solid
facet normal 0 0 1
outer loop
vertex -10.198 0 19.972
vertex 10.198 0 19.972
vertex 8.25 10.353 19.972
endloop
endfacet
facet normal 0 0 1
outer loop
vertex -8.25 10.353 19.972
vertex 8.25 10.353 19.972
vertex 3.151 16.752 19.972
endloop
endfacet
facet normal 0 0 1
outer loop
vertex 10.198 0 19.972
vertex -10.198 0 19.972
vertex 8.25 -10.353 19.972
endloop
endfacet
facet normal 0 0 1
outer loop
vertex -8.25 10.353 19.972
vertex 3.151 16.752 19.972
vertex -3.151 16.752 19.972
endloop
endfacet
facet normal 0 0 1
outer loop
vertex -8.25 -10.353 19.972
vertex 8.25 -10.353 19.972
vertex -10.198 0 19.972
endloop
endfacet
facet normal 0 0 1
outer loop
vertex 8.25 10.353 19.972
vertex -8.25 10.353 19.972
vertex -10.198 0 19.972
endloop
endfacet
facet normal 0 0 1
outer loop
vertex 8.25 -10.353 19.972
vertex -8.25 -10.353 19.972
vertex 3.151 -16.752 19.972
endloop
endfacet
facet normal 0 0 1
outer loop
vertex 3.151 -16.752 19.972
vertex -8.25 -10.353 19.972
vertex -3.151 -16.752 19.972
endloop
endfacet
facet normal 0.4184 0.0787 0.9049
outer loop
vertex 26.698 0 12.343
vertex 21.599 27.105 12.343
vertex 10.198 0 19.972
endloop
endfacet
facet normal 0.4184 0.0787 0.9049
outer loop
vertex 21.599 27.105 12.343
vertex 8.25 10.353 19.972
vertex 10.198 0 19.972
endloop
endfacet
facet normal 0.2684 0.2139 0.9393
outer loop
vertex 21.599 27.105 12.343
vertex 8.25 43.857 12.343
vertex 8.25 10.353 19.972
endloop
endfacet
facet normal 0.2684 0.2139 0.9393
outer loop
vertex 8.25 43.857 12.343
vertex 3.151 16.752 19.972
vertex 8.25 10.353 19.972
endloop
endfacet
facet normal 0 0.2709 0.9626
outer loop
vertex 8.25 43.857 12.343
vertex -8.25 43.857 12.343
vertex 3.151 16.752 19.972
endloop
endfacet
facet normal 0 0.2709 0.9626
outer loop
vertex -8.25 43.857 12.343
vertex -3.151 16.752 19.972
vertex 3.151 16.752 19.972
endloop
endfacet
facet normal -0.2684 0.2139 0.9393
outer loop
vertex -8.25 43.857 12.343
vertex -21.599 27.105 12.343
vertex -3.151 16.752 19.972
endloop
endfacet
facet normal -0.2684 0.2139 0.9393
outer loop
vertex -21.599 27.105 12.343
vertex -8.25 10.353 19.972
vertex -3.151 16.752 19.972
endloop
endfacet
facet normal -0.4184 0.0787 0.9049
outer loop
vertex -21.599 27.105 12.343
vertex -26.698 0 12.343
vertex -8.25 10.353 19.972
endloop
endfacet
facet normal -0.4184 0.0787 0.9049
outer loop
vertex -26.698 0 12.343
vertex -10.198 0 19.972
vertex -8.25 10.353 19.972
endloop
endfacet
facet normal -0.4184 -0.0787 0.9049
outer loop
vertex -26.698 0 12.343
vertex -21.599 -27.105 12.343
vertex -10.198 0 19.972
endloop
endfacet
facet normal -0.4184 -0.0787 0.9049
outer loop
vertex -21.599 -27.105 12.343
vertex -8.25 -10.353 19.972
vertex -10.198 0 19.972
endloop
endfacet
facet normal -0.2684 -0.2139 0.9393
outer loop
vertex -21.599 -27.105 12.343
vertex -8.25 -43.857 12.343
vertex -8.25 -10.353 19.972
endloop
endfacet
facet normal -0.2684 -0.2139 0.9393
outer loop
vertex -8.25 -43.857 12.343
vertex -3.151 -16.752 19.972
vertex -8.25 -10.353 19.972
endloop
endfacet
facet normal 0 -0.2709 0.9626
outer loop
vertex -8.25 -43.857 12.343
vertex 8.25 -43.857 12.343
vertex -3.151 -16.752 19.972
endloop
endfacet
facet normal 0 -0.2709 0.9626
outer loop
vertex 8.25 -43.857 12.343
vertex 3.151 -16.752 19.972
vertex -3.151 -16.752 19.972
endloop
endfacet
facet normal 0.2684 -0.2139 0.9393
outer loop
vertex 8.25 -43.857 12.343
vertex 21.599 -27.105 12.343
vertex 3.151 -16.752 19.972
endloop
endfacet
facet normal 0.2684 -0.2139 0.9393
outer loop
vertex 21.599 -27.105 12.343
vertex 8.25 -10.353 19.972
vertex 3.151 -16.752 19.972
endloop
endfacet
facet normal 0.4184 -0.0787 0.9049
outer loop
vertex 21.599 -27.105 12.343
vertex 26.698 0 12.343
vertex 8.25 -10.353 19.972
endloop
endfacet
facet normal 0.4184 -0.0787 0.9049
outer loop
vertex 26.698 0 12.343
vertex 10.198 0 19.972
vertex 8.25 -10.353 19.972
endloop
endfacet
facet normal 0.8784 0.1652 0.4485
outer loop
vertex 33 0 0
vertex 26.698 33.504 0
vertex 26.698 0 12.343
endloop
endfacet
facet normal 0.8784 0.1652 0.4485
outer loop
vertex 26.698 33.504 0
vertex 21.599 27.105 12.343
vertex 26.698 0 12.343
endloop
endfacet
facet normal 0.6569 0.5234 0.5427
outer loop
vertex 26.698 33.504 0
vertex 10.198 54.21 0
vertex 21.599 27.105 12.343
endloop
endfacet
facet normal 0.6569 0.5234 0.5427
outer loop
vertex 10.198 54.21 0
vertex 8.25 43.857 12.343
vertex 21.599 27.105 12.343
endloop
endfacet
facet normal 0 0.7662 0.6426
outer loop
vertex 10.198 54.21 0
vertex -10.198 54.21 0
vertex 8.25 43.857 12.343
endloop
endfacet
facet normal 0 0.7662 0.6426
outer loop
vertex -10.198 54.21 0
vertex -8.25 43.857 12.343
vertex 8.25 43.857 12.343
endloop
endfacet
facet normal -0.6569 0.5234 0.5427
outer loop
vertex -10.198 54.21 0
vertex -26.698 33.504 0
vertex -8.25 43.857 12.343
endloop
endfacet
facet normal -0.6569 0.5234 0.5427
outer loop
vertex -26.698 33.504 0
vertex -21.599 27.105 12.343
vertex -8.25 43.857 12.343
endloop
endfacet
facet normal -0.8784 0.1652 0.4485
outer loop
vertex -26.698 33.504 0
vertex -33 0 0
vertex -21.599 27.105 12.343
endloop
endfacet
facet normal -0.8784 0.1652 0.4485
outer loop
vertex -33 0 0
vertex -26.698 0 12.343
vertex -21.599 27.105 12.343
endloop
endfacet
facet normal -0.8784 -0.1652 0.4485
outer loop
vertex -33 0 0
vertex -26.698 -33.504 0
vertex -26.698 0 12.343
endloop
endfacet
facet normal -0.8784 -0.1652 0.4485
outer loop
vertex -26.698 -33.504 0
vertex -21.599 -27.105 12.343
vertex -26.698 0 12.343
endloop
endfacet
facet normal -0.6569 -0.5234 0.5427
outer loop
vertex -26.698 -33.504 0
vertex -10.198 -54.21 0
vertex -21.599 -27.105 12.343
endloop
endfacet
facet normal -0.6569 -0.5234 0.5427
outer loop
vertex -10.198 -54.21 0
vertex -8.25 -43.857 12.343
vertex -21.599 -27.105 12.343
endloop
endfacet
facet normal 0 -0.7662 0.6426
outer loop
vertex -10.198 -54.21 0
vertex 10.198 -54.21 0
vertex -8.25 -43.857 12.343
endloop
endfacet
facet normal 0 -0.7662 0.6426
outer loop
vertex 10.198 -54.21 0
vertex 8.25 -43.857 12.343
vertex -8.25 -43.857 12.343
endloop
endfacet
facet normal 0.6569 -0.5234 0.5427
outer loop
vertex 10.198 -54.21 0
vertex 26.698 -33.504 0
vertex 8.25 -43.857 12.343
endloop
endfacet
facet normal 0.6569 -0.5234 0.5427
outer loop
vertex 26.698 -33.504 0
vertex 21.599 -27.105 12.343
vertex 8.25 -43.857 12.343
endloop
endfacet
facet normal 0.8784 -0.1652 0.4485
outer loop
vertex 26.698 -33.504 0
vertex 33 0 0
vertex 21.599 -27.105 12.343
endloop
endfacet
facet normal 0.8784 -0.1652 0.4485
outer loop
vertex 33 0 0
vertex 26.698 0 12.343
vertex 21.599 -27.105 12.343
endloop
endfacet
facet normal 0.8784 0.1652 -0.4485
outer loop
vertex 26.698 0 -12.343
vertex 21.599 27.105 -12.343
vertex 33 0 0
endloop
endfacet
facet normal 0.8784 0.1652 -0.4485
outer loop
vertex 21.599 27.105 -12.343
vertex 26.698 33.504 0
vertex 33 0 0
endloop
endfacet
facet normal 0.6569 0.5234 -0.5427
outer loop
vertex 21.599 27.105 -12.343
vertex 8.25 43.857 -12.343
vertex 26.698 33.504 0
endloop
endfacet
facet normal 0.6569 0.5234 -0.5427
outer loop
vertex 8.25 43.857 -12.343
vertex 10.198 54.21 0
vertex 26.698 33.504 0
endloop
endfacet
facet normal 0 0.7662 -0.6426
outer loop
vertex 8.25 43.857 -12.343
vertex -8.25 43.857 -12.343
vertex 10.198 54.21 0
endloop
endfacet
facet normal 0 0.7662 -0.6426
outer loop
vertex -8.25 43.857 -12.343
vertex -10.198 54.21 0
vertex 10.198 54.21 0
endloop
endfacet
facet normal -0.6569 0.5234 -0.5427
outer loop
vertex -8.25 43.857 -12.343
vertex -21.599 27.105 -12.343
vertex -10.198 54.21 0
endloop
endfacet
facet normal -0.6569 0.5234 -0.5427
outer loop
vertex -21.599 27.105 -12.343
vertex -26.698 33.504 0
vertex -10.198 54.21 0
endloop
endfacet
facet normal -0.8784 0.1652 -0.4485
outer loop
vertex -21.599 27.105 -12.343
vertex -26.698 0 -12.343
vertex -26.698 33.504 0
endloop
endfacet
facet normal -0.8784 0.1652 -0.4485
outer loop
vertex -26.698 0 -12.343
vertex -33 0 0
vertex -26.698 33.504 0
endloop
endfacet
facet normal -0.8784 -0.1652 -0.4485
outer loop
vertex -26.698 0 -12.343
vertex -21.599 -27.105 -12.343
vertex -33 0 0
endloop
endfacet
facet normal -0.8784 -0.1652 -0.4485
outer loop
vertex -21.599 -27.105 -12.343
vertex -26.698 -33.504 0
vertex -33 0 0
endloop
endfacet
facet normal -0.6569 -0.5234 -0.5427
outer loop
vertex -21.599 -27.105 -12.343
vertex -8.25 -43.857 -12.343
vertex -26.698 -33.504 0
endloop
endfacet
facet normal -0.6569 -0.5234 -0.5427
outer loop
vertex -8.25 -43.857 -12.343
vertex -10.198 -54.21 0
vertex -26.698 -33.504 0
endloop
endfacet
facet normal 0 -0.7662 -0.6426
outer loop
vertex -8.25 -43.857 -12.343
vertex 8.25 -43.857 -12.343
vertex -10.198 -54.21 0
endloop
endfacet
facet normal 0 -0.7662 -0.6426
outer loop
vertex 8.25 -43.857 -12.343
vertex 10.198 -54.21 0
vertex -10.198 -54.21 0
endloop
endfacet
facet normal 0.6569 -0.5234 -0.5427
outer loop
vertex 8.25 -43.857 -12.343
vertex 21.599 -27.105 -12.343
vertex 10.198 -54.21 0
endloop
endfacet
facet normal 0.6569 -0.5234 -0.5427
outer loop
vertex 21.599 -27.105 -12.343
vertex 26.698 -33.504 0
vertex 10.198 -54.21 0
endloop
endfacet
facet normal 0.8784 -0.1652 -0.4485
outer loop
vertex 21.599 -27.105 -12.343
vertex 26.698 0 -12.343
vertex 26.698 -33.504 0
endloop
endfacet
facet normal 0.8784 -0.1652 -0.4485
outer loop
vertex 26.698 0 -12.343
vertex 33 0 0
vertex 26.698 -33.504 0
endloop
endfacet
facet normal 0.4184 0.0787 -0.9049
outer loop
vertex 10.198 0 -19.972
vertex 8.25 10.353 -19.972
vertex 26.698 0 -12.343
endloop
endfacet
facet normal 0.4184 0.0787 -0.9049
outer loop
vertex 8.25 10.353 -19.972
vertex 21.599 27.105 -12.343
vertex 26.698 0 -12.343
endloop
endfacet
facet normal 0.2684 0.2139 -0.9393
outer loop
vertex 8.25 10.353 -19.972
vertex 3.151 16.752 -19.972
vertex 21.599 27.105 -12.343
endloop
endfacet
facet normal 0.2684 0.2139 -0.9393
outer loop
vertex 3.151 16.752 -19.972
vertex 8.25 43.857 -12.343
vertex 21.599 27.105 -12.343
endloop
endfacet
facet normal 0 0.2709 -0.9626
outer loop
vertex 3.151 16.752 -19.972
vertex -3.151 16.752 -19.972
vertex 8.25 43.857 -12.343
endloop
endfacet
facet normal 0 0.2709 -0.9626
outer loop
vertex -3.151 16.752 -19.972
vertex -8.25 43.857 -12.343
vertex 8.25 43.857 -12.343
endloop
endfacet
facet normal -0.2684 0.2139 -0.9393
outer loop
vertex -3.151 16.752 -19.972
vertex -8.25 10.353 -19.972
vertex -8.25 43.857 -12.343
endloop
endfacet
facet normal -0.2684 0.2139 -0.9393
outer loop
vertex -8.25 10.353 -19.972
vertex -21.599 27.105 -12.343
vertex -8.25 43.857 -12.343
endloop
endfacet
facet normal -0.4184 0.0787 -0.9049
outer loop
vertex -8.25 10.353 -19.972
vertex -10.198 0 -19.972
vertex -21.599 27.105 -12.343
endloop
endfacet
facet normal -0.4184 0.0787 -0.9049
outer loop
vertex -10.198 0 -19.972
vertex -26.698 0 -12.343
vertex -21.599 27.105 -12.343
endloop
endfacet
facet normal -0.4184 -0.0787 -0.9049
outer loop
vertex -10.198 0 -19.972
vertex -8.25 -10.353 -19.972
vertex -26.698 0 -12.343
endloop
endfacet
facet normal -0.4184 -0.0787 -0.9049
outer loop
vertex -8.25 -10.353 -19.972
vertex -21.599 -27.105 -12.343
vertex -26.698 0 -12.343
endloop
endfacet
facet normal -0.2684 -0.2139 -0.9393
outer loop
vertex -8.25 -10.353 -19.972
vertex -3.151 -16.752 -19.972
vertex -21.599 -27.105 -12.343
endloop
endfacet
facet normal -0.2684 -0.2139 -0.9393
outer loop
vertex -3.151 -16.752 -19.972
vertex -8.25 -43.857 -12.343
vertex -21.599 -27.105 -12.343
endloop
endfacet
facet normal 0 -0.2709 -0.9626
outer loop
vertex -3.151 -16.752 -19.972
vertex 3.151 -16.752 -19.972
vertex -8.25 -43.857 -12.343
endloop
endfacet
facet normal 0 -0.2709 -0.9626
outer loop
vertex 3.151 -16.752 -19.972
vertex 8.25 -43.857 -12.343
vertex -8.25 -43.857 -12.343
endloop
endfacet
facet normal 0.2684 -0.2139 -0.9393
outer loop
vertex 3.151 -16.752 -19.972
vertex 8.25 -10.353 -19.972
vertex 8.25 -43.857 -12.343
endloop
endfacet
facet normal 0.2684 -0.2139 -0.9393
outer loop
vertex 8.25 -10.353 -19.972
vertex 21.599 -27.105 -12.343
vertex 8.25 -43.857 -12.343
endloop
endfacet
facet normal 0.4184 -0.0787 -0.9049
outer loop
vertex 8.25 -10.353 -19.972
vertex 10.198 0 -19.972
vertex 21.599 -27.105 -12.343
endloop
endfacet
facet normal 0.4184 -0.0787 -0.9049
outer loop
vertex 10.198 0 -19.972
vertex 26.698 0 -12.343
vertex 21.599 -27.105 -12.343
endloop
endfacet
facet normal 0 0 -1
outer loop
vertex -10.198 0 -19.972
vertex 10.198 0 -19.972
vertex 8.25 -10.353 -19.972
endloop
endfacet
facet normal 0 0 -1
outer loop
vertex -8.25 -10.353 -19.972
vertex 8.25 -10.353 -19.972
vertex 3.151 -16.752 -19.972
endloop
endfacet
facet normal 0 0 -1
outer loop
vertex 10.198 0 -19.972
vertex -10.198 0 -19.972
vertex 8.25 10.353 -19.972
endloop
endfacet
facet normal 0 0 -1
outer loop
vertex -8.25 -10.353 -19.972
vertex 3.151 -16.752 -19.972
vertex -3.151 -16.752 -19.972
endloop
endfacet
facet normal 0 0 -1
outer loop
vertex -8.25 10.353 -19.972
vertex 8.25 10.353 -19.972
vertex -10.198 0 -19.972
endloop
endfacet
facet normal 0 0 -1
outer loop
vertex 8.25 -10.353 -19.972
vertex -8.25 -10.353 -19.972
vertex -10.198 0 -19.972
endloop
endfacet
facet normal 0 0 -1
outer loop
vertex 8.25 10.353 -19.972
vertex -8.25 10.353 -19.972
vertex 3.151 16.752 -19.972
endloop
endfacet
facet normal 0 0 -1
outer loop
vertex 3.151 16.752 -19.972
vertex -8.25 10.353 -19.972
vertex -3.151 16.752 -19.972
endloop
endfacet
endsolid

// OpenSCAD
// Generated by SolidPython 1.0.1 on 2020-07-29 00:46:50


scale(v = [11, 19, 7]) {
	sphere(r = 3);
}
/***********************************************
*********      SolidPython code:      **********
************************************************
 
# import packages: SolidPython
from solid import *
from solid.utils import *
from itertools import chain, combinations, permutations


class Resize:

    def __init__(self, scad_file):
        self.scad_file = scad_file
        #self.scad_file = import_scad(scad_file)
        # cone/cylinder param:
        self.r1 = 0
        self.r2 = 0
        self.h = 0
        # rectangular prism param:
        self.w = 0
        self.l = 0
        # ellipse param:
        self.r = 0

    # import OpenScad code (file name corresponds to shape)


    # classify shape + parameters
    def assign(self, param1, param2, param3):
        if self.scad_file == 'cone.scad':
            self.r1 = param1
            self.r2 = param2
            self.h = param3
        elif self.scad_file == 'cylinder.scad':
            self.r1 = param1
            self.r2 = param2
            self.h = param3
        elif self.scad_file == 'rectangularPrism.scad':
            self.h = param1
            self.l = param2
            self.w = param3
        else:
            self.r = param1
            self.h = param2

    # resize parameters
    def iterate(self):
        x = range(3, 20, 2)
        i = 1
        if self.scad_file == 'cone.scad':
            tempList = list(permutations(x, 2))
            for temp in tempList:
                param1 = temp[0]
                param2 = temp[1]
                filepath = 'produced_scad_files/' + 'cone' + str(param1) + '_' + str(param2) + '_' + '.scad'
                scad_render_to_file(cylinder(h=param1, r1=param2, r2=0), filepath)

        elif self.scad_file == 'cylinder.scad':
            tempList = list(permutations(x, 3))
            for temp in tempList:
                param1 = temp[0]
                param2 = temp[1]
                filepath = 'produced_scad_files/' + 'cylinder' + str(param1) + '_' + str(param2) + '_' + '.scad'
                scad_render_to_file(cylinder(h=param1, r1=param2, r2=param2), filepath)

        elif self.scad_file == 'rectangularPrism.scad':
            tempList = list(permutations(x, 3))
            for temp in tempList:
                param1 = temp[0]
                param2 = temp[1]
                param3 = temp[2]
                filepath = 'produced_scad_files/' + 'rectangularPrism' + str(param1) + '_' + str(param2) + '_' + str(
                    param3) + '.scad'
                scad_render_to_file(cube(size=(param1, param2, param3)), filepath)

        elif self.scad_file == 'ellipse.scad':
            tempList = list(permutations(x, 4))
            for temp in tempList:
                param1 = temp[0]
                param2 = temp[1]
                param3 = temp[2]
                param4 = temp[3]
                filepath = 'produced_scad_files/' + 'ellipse' + str(param1) + '_' + str(param2) + '_' + str(param3) + '_' + str(param4) + '.scad'
                scad_render_to_file(scale([param1, param2, param3])(sphere(r=param4)), filepath)

    def render_to_scadfile(self):
        scad_render_to_file(scad, 'example.scad') 
 
************************************************/
